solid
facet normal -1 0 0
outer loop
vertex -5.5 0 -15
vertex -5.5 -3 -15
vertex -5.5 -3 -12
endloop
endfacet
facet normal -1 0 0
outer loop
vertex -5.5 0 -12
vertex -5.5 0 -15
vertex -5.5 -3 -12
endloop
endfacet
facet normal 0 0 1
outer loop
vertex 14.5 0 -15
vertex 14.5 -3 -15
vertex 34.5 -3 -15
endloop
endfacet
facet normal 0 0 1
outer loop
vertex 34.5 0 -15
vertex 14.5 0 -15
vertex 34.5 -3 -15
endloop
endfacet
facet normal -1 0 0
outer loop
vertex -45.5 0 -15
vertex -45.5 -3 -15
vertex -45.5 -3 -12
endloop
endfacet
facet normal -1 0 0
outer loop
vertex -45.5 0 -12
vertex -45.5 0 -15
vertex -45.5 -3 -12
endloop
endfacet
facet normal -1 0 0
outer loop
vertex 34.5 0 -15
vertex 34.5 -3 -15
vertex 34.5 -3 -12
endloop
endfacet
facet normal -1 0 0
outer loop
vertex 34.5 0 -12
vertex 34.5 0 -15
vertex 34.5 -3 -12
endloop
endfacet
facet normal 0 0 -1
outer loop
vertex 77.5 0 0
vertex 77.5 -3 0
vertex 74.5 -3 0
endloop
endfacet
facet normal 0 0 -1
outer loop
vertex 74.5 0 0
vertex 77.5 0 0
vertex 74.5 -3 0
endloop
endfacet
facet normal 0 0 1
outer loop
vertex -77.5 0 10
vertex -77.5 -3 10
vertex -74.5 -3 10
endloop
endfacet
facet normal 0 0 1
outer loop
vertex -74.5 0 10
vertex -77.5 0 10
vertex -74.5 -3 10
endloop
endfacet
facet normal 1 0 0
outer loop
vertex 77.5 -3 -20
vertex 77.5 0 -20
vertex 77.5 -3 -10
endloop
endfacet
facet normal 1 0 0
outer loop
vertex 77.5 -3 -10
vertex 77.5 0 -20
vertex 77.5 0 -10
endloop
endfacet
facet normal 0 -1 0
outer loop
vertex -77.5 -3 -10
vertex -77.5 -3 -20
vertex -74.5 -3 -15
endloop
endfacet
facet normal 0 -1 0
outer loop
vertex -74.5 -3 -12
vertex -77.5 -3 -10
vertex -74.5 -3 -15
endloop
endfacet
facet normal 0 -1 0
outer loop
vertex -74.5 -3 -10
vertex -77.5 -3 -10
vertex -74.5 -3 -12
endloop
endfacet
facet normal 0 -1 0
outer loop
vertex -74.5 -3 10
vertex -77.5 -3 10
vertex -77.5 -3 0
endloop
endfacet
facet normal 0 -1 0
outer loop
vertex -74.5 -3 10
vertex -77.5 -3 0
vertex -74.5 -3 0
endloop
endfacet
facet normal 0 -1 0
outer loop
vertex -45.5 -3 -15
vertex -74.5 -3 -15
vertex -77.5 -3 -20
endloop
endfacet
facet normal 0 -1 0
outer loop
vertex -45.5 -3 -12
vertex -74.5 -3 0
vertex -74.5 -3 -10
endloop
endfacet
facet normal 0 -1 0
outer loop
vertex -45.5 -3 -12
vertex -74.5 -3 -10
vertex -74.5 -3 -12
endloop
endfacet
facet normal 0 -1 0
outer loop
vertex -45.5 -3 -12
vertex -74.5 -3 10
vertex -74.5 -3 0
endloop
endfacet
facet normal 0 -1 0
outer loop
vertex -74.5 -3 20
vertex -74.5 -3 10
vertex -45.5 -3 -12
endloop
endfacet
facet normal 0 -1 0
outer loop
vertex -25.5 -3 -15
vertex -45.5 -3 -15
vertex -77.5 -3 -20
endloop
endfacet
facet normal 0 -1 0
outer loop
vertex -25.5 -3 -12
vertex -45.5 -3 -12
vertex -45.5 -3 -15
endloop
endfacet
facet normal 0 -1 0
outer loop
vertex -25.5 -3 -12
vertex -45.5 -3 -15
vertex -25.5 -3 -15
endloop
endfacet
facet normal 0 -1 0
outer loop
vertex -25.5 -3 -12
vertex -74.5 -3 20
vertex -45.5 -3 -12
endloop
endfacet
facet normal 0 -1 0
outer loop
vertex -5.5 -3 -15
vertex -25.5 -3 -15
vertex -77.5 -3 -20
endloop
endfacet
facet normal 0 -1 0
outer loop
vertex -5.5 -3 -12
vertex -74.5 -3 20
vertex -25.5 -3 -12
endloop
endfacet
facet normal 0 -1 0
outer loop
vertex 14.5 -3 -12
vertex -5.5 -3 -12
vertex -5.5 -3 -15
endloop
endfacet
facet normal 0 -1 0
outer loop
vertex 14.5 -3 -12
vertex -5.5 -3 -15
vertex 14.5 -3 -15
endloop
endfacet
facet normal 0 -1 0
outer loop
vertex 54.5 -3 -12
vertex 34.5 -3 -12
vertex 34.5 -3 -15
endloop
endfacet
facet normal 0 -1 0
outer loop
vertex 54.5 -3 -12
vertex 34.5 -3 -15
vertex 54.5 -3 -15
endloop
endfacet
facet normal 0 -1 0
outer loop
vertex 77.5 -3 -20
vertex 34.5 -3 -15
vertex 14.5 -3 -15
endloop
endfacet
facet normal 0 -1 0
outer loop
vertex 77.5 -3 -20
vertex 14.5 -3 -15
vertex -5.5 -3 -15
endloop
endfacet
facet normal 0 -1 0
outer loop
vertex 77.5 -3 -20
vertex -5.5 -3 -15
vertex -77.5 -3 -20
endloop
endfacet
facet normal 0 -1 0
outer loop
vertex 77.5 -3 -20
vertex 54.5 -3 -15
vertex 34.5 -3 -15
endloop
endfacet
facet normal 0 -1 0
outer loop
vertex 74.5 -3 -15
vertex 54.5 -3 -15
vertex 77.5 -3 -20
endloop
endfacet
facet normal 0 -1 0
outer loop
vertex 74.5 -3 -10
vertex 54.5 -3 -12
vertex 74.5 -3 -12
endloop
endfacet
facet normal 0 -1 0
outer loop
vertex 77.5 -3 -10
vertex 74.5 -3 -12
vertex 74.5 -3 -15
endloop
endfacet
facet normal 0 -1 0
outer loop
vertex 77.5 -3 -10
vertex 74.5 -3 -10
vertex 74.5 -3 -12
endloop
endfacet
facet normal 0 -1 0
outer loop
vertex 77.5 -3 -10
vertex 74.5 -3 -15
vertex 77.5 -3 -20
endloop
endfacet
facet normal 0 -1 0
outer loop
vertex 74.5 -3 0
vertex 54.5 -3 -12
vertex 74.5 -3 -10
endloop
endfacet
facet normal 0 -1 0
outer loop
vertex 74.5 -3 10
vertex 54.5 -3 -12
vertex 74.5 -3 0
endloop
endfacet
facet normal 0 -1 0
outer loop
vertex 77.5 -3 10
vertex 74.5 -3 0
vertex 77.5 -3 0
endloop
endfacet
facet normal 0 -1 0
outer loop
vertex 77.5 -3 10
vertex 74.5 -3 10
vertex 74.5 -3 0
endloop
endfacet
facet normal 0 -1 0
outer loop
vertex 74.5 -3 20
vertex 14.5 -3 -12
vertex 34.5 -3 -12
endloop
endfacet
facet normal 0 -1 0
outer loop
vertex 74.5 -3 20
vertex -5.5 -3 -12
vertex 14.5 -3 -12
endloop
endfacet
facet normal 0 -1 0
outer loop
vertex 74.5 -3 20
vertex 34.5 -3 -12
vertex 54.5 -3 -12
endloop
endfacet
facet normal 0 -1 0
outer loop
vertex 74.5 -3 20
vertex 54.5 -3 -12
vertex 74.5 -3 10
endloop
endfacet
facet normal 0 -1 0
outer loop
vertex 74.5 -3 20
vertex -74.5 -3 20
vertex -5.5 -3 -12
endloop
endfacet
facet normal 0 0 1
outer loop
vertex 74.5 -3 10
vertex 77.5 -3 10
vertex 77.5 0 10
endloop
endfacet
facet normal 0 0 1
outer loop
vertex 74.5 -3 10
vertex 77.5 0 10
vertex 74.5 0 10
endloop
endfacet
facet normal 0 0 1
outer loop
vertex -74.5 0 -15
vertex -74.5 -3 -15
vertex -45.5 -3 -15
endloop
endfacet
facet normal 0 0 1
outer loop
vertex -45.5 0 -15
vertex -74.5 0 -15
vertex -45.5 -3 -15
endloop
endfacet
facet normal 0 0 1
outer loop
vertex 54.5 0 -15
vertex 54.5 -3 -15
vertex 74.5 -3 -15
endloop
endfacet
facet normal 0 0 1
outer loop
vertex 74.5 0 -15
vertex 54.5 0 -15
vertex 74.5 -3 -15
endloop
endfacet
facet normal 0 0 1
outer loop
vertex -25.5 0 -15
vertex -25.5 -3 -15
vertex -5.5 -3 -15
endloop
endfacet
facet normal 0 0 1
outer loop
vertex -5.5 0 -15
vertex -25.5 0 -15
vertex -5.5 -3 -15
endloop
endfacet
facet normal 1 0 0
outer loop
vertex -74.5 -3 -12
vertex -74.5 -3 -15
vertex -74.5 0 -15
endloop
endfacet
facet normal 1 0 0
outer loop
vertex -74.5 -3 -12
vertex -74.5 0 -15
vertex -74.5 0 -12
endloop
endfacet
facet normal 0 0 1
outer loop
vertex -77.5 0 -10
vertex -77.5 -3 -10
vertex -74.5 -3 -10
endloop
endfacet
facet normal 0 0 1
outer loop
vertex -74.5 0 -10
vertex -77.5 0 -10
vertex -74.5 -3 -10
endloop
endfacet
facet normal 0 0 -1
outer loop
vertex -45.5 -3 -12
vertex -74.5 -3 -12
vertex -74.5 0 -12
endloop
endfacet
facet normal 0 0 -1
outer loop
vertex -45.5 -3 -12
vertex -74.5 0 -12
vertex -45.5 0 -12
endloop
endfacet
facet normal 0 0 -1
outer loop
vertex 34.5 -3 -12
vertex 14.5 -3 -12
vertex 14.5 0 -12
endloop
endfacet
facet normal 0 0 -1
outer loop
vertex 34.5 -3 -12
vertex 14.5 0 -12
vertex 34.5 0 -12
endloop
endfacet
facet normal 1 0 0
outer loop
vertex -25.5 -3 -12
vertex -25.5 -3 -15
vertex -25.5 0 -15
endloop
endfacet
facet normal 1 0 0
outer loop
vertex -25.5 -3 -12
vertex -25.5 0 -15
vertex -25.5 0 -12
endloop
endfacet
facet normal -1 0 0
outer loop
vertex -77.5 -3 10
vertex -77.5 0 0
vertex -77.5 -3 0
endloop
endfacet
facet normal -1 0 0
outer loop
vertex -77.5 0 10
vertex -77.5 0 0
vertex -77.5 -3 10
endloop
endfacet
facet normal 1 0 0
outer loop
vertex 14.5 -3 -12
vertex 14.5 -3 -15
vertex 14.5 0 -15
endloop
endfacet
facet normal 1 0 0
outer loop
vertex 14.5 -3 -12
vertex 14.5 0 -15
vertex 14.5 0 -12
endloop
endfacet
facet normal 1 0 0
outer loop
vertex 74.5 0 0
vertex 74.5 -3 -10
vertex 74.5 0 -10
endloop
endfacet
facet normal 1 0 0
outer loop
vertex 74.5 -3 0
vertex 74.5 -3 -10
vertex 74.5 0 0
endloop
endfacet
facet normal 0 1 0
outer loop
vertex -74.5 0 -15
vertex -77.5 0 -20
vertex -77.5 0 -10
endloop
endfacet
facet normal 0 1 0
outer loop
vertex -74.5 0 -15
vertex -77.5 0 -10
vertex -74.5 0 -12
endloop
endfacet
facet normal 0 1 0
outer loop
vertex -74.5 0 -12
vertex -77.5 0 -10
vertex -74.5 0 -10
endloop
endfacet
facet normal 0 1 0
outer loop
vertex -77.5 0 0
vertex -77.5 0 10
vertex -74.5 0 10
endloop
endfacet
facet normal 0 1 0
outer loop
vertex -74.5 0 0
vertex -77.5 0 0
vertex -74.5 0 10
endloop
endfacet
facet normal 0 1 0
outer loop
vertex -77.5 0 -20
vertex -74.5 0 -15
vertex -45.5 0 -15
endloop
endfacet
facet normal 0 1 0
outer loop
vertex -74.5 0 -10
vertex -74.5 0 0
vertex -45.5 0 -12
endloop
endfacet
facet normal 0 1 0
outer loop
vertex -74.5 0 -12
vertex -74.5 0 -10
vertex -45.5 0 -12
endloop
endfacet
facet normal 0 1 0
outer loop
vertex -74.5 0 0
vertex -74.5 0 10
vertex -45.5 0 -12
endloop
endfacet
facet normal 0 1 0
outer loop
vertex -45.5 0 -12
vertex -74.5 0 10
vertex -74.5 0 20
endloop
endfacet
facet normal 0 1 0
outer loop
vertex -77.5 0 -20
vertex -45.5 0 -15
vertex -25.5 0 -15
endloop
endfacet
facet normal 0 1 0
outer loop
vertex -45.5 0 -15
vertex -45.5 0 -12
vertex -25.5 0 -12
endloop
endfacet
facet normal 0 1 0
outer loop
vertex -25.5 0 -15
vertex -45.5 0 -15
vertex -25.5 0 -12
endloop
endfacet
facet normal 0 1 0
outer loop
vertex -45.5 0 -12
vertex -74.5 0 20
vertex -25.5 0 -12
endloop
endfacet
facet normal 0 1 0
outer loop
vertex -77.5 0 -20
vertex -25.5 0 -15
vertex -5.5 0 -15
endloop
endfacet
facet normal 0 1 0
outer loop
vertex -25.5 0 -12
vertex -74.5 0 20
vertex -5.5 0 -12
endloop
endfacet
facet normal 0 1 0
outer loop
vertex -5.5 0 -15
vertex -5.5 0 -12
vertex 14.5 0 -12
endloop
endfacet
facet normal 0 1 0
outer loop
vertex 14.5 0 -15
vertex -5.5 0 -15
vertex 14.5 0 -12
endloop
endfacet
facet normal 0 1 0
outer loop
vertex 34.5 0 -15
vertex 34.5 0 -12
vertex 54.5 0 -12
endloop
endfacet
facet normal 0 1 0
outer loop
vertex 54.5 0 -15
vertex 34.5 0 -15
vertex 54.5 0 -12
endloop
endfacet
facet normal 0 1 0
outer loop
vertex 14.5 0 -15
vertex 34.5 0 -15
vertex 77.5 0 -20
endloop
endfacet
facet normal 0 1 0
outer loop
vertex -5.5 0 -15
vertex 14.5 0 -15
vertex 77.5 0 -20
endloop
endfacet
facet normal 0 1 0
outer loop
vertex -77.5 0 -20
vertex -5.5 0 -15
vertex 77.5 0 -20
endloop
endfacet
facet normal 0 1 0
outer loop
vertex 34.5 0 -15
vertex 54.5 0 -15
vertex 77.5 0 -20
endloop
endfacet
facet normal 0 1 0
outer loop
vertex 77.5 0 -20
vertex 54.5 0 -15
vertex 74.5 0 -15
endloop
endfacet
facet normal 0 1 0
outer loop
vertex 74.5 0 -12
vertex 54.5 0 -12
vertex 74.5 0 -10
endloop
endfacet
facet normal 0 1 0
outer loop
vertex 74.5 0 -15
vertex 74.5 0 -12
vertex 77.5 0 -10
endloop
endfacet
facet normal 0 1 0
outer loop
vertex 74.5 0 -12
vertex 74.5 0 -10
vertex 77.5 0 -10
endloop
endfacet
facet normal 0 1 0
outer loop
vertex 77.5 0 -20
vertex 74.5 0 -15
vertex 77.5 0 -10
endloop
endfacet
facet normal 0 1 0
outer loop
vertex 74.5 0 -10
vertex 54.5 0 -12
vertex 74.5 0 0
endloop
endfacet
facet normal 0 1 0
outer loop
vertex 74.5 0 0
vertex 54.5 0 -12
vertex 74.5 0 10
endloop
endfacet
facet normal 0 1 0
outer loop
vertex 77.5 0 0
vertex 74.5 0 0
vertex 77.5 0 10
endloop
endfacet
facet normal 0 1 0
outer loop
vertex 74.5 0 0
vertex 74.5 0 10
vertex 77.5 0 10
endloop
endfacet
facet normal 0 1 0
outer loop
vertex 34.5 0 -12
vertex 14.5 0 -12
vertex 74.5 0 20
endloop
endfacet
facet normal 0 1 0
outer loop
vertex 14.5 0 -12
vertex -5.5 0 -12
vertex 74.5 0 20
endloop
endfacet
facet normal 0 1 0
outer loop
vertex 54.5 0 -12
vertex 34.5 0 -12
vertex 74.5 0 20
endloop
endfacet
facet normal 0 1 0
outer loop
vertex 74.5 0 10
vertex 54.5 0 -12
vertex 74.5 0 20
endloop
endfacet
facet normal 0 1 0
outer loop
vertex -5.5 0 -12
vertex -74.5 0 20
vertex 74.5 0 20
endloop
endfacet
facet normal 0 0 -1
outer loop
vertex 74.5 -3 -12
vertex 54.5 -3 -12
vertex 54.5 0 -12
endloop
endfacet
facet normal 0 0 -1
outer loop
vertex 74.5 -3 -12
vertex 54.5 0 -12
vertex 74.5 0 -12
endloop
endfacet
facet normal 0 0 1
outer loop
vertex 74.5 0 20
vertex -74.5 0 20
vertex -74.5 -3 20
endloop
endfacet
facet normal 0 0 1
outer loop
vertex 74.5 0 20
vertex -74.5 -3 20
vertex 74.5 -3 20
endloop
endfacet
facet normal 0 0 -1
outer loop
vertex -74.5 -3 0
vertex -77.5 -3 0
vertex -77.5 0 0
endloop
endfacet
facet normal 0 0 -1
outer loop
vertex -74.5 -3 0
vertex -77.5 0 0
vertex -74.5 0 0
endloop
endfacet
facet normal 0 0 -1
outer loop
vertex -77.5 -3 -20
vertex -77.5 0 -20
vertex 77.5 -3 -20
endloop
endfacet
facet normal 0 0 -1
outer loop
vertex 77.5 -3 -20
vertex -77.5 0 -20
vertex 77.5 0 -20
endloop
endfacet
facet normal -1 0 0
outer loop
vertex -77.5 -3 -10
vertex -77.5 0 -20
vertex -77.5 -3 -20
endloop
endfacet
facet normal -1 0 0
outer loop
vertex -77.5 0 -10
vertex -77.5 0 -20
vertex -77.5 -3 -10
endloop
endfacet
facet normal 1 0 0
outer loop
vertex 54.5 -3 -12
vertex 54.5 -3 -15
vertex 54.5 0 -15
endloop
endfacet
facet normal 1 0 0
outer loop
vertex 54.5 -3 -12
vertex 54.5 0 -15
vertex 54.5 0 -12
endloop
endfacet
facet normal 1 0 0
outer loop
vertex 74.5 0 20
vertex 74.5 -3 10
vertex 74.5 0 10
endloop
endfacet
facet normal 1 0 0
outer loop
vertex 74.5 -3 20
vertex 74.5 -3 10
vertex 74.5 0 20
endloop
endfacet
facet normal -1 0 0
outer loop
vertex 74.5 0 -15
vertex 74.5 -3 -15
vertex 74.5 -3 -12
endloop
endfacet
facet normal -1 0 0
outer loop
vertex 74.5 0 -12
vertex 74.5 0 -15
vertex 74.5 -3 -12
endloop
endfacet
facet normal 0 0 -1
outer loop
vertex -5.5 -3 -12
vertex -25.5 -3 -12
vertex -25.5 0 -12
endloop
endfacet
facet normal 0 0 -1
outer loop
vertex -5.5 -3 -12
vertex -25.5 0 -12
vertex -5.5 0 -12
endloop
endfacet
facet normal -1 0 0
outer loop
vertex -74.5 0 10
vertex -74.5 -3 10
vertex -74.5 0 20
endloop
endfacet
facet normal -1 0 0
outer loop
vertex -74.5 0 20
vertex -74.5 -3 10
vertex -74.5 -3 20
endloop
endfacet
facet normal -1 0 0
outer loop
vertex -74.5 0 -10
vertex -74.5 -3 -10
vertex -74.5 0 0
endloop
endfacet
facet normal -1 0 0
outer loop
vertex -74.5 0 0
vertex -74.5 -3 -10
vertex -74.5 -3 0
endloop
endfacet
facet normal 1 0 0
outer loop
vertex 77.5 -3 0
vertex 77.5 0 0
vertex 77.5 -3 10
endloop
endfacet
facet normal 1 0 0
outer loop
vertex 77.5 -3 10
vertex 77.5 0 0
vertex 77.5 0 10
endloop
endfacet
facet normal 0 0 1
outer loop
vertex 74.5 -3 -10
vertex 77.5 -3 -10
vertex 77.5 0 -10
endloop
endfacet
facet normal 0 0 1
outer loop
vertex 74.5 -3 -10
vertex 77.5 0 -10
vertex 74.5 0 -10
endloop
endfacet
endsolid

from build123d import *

# Parameters (mm, degrees)
SKETCH_W        = 155
SKETCH_H        = 40
PAD_DEPTH       = 3
SKETCH001_W     = 20
SKETCH001_H     = 3
SKETCH001_W_2   = 29
POCKET_DEPTH    = 3.001
SKETCH002_W     = 3
SKETCH002_H     = 10
POCKET001_DEPTH = 323.213429


with BuildPart() as part:
    # Sketch → Pad (new body)
    with BuildSketch(Plane.XZ):
        Rectangle(SKETCH_W, SKETCH_H)
    extrude(amount=PAD_DEPTH)

    # Sketch001 (on Face6 of Pad) → Pocket (cut, through all)
    with BuildSketch(Plane.XZ.offset(3)):
        with Locations((64.5, -13.5)):
            Rectangle(SKETCH001_W, SKETCH001_H)
        with Locations((24.5, -13.5)):
            Rectangle(SKETCH001_W, SKETCH001_H)
        with Locations((-15.5, -13.5)):
            Rectangle(SKETCH001_W, SKETCH001_H)
        with Locations((-60, -13.5)):
            Rectangle(SKETCH001_W_2, SKETCH001_H)
    extrude(amount=-POCKET_DEPTH, mode=Mode.SUBTRACT)

    # Sketch002 (on Face5 of Pocket) → Pocket001 (cut, through all)
    with BuildSketch(Plane.XZ.offset(3)):
        with Locations((-76, 15)):
            Rectangle(SKETCH002_W, SKETCH002_H)
        with Locations((-76, -5)):
            Rectangle(SKETCH002_W, SKETCH002_H)
    pocket001 = extrude(amount=-POCKET001_DEPTH, mode=Mode.SUBTRACT)

    # Mirrored: Pocket001 across Sketch002 V_Axis
    add(pocket001.mirror(Plane(origin=(0, -3, 0), x_dir=(0, -1, 0), z_dir=(1, 0, 0))), mode=Mode.SUBTRACT)


solid = part.part
